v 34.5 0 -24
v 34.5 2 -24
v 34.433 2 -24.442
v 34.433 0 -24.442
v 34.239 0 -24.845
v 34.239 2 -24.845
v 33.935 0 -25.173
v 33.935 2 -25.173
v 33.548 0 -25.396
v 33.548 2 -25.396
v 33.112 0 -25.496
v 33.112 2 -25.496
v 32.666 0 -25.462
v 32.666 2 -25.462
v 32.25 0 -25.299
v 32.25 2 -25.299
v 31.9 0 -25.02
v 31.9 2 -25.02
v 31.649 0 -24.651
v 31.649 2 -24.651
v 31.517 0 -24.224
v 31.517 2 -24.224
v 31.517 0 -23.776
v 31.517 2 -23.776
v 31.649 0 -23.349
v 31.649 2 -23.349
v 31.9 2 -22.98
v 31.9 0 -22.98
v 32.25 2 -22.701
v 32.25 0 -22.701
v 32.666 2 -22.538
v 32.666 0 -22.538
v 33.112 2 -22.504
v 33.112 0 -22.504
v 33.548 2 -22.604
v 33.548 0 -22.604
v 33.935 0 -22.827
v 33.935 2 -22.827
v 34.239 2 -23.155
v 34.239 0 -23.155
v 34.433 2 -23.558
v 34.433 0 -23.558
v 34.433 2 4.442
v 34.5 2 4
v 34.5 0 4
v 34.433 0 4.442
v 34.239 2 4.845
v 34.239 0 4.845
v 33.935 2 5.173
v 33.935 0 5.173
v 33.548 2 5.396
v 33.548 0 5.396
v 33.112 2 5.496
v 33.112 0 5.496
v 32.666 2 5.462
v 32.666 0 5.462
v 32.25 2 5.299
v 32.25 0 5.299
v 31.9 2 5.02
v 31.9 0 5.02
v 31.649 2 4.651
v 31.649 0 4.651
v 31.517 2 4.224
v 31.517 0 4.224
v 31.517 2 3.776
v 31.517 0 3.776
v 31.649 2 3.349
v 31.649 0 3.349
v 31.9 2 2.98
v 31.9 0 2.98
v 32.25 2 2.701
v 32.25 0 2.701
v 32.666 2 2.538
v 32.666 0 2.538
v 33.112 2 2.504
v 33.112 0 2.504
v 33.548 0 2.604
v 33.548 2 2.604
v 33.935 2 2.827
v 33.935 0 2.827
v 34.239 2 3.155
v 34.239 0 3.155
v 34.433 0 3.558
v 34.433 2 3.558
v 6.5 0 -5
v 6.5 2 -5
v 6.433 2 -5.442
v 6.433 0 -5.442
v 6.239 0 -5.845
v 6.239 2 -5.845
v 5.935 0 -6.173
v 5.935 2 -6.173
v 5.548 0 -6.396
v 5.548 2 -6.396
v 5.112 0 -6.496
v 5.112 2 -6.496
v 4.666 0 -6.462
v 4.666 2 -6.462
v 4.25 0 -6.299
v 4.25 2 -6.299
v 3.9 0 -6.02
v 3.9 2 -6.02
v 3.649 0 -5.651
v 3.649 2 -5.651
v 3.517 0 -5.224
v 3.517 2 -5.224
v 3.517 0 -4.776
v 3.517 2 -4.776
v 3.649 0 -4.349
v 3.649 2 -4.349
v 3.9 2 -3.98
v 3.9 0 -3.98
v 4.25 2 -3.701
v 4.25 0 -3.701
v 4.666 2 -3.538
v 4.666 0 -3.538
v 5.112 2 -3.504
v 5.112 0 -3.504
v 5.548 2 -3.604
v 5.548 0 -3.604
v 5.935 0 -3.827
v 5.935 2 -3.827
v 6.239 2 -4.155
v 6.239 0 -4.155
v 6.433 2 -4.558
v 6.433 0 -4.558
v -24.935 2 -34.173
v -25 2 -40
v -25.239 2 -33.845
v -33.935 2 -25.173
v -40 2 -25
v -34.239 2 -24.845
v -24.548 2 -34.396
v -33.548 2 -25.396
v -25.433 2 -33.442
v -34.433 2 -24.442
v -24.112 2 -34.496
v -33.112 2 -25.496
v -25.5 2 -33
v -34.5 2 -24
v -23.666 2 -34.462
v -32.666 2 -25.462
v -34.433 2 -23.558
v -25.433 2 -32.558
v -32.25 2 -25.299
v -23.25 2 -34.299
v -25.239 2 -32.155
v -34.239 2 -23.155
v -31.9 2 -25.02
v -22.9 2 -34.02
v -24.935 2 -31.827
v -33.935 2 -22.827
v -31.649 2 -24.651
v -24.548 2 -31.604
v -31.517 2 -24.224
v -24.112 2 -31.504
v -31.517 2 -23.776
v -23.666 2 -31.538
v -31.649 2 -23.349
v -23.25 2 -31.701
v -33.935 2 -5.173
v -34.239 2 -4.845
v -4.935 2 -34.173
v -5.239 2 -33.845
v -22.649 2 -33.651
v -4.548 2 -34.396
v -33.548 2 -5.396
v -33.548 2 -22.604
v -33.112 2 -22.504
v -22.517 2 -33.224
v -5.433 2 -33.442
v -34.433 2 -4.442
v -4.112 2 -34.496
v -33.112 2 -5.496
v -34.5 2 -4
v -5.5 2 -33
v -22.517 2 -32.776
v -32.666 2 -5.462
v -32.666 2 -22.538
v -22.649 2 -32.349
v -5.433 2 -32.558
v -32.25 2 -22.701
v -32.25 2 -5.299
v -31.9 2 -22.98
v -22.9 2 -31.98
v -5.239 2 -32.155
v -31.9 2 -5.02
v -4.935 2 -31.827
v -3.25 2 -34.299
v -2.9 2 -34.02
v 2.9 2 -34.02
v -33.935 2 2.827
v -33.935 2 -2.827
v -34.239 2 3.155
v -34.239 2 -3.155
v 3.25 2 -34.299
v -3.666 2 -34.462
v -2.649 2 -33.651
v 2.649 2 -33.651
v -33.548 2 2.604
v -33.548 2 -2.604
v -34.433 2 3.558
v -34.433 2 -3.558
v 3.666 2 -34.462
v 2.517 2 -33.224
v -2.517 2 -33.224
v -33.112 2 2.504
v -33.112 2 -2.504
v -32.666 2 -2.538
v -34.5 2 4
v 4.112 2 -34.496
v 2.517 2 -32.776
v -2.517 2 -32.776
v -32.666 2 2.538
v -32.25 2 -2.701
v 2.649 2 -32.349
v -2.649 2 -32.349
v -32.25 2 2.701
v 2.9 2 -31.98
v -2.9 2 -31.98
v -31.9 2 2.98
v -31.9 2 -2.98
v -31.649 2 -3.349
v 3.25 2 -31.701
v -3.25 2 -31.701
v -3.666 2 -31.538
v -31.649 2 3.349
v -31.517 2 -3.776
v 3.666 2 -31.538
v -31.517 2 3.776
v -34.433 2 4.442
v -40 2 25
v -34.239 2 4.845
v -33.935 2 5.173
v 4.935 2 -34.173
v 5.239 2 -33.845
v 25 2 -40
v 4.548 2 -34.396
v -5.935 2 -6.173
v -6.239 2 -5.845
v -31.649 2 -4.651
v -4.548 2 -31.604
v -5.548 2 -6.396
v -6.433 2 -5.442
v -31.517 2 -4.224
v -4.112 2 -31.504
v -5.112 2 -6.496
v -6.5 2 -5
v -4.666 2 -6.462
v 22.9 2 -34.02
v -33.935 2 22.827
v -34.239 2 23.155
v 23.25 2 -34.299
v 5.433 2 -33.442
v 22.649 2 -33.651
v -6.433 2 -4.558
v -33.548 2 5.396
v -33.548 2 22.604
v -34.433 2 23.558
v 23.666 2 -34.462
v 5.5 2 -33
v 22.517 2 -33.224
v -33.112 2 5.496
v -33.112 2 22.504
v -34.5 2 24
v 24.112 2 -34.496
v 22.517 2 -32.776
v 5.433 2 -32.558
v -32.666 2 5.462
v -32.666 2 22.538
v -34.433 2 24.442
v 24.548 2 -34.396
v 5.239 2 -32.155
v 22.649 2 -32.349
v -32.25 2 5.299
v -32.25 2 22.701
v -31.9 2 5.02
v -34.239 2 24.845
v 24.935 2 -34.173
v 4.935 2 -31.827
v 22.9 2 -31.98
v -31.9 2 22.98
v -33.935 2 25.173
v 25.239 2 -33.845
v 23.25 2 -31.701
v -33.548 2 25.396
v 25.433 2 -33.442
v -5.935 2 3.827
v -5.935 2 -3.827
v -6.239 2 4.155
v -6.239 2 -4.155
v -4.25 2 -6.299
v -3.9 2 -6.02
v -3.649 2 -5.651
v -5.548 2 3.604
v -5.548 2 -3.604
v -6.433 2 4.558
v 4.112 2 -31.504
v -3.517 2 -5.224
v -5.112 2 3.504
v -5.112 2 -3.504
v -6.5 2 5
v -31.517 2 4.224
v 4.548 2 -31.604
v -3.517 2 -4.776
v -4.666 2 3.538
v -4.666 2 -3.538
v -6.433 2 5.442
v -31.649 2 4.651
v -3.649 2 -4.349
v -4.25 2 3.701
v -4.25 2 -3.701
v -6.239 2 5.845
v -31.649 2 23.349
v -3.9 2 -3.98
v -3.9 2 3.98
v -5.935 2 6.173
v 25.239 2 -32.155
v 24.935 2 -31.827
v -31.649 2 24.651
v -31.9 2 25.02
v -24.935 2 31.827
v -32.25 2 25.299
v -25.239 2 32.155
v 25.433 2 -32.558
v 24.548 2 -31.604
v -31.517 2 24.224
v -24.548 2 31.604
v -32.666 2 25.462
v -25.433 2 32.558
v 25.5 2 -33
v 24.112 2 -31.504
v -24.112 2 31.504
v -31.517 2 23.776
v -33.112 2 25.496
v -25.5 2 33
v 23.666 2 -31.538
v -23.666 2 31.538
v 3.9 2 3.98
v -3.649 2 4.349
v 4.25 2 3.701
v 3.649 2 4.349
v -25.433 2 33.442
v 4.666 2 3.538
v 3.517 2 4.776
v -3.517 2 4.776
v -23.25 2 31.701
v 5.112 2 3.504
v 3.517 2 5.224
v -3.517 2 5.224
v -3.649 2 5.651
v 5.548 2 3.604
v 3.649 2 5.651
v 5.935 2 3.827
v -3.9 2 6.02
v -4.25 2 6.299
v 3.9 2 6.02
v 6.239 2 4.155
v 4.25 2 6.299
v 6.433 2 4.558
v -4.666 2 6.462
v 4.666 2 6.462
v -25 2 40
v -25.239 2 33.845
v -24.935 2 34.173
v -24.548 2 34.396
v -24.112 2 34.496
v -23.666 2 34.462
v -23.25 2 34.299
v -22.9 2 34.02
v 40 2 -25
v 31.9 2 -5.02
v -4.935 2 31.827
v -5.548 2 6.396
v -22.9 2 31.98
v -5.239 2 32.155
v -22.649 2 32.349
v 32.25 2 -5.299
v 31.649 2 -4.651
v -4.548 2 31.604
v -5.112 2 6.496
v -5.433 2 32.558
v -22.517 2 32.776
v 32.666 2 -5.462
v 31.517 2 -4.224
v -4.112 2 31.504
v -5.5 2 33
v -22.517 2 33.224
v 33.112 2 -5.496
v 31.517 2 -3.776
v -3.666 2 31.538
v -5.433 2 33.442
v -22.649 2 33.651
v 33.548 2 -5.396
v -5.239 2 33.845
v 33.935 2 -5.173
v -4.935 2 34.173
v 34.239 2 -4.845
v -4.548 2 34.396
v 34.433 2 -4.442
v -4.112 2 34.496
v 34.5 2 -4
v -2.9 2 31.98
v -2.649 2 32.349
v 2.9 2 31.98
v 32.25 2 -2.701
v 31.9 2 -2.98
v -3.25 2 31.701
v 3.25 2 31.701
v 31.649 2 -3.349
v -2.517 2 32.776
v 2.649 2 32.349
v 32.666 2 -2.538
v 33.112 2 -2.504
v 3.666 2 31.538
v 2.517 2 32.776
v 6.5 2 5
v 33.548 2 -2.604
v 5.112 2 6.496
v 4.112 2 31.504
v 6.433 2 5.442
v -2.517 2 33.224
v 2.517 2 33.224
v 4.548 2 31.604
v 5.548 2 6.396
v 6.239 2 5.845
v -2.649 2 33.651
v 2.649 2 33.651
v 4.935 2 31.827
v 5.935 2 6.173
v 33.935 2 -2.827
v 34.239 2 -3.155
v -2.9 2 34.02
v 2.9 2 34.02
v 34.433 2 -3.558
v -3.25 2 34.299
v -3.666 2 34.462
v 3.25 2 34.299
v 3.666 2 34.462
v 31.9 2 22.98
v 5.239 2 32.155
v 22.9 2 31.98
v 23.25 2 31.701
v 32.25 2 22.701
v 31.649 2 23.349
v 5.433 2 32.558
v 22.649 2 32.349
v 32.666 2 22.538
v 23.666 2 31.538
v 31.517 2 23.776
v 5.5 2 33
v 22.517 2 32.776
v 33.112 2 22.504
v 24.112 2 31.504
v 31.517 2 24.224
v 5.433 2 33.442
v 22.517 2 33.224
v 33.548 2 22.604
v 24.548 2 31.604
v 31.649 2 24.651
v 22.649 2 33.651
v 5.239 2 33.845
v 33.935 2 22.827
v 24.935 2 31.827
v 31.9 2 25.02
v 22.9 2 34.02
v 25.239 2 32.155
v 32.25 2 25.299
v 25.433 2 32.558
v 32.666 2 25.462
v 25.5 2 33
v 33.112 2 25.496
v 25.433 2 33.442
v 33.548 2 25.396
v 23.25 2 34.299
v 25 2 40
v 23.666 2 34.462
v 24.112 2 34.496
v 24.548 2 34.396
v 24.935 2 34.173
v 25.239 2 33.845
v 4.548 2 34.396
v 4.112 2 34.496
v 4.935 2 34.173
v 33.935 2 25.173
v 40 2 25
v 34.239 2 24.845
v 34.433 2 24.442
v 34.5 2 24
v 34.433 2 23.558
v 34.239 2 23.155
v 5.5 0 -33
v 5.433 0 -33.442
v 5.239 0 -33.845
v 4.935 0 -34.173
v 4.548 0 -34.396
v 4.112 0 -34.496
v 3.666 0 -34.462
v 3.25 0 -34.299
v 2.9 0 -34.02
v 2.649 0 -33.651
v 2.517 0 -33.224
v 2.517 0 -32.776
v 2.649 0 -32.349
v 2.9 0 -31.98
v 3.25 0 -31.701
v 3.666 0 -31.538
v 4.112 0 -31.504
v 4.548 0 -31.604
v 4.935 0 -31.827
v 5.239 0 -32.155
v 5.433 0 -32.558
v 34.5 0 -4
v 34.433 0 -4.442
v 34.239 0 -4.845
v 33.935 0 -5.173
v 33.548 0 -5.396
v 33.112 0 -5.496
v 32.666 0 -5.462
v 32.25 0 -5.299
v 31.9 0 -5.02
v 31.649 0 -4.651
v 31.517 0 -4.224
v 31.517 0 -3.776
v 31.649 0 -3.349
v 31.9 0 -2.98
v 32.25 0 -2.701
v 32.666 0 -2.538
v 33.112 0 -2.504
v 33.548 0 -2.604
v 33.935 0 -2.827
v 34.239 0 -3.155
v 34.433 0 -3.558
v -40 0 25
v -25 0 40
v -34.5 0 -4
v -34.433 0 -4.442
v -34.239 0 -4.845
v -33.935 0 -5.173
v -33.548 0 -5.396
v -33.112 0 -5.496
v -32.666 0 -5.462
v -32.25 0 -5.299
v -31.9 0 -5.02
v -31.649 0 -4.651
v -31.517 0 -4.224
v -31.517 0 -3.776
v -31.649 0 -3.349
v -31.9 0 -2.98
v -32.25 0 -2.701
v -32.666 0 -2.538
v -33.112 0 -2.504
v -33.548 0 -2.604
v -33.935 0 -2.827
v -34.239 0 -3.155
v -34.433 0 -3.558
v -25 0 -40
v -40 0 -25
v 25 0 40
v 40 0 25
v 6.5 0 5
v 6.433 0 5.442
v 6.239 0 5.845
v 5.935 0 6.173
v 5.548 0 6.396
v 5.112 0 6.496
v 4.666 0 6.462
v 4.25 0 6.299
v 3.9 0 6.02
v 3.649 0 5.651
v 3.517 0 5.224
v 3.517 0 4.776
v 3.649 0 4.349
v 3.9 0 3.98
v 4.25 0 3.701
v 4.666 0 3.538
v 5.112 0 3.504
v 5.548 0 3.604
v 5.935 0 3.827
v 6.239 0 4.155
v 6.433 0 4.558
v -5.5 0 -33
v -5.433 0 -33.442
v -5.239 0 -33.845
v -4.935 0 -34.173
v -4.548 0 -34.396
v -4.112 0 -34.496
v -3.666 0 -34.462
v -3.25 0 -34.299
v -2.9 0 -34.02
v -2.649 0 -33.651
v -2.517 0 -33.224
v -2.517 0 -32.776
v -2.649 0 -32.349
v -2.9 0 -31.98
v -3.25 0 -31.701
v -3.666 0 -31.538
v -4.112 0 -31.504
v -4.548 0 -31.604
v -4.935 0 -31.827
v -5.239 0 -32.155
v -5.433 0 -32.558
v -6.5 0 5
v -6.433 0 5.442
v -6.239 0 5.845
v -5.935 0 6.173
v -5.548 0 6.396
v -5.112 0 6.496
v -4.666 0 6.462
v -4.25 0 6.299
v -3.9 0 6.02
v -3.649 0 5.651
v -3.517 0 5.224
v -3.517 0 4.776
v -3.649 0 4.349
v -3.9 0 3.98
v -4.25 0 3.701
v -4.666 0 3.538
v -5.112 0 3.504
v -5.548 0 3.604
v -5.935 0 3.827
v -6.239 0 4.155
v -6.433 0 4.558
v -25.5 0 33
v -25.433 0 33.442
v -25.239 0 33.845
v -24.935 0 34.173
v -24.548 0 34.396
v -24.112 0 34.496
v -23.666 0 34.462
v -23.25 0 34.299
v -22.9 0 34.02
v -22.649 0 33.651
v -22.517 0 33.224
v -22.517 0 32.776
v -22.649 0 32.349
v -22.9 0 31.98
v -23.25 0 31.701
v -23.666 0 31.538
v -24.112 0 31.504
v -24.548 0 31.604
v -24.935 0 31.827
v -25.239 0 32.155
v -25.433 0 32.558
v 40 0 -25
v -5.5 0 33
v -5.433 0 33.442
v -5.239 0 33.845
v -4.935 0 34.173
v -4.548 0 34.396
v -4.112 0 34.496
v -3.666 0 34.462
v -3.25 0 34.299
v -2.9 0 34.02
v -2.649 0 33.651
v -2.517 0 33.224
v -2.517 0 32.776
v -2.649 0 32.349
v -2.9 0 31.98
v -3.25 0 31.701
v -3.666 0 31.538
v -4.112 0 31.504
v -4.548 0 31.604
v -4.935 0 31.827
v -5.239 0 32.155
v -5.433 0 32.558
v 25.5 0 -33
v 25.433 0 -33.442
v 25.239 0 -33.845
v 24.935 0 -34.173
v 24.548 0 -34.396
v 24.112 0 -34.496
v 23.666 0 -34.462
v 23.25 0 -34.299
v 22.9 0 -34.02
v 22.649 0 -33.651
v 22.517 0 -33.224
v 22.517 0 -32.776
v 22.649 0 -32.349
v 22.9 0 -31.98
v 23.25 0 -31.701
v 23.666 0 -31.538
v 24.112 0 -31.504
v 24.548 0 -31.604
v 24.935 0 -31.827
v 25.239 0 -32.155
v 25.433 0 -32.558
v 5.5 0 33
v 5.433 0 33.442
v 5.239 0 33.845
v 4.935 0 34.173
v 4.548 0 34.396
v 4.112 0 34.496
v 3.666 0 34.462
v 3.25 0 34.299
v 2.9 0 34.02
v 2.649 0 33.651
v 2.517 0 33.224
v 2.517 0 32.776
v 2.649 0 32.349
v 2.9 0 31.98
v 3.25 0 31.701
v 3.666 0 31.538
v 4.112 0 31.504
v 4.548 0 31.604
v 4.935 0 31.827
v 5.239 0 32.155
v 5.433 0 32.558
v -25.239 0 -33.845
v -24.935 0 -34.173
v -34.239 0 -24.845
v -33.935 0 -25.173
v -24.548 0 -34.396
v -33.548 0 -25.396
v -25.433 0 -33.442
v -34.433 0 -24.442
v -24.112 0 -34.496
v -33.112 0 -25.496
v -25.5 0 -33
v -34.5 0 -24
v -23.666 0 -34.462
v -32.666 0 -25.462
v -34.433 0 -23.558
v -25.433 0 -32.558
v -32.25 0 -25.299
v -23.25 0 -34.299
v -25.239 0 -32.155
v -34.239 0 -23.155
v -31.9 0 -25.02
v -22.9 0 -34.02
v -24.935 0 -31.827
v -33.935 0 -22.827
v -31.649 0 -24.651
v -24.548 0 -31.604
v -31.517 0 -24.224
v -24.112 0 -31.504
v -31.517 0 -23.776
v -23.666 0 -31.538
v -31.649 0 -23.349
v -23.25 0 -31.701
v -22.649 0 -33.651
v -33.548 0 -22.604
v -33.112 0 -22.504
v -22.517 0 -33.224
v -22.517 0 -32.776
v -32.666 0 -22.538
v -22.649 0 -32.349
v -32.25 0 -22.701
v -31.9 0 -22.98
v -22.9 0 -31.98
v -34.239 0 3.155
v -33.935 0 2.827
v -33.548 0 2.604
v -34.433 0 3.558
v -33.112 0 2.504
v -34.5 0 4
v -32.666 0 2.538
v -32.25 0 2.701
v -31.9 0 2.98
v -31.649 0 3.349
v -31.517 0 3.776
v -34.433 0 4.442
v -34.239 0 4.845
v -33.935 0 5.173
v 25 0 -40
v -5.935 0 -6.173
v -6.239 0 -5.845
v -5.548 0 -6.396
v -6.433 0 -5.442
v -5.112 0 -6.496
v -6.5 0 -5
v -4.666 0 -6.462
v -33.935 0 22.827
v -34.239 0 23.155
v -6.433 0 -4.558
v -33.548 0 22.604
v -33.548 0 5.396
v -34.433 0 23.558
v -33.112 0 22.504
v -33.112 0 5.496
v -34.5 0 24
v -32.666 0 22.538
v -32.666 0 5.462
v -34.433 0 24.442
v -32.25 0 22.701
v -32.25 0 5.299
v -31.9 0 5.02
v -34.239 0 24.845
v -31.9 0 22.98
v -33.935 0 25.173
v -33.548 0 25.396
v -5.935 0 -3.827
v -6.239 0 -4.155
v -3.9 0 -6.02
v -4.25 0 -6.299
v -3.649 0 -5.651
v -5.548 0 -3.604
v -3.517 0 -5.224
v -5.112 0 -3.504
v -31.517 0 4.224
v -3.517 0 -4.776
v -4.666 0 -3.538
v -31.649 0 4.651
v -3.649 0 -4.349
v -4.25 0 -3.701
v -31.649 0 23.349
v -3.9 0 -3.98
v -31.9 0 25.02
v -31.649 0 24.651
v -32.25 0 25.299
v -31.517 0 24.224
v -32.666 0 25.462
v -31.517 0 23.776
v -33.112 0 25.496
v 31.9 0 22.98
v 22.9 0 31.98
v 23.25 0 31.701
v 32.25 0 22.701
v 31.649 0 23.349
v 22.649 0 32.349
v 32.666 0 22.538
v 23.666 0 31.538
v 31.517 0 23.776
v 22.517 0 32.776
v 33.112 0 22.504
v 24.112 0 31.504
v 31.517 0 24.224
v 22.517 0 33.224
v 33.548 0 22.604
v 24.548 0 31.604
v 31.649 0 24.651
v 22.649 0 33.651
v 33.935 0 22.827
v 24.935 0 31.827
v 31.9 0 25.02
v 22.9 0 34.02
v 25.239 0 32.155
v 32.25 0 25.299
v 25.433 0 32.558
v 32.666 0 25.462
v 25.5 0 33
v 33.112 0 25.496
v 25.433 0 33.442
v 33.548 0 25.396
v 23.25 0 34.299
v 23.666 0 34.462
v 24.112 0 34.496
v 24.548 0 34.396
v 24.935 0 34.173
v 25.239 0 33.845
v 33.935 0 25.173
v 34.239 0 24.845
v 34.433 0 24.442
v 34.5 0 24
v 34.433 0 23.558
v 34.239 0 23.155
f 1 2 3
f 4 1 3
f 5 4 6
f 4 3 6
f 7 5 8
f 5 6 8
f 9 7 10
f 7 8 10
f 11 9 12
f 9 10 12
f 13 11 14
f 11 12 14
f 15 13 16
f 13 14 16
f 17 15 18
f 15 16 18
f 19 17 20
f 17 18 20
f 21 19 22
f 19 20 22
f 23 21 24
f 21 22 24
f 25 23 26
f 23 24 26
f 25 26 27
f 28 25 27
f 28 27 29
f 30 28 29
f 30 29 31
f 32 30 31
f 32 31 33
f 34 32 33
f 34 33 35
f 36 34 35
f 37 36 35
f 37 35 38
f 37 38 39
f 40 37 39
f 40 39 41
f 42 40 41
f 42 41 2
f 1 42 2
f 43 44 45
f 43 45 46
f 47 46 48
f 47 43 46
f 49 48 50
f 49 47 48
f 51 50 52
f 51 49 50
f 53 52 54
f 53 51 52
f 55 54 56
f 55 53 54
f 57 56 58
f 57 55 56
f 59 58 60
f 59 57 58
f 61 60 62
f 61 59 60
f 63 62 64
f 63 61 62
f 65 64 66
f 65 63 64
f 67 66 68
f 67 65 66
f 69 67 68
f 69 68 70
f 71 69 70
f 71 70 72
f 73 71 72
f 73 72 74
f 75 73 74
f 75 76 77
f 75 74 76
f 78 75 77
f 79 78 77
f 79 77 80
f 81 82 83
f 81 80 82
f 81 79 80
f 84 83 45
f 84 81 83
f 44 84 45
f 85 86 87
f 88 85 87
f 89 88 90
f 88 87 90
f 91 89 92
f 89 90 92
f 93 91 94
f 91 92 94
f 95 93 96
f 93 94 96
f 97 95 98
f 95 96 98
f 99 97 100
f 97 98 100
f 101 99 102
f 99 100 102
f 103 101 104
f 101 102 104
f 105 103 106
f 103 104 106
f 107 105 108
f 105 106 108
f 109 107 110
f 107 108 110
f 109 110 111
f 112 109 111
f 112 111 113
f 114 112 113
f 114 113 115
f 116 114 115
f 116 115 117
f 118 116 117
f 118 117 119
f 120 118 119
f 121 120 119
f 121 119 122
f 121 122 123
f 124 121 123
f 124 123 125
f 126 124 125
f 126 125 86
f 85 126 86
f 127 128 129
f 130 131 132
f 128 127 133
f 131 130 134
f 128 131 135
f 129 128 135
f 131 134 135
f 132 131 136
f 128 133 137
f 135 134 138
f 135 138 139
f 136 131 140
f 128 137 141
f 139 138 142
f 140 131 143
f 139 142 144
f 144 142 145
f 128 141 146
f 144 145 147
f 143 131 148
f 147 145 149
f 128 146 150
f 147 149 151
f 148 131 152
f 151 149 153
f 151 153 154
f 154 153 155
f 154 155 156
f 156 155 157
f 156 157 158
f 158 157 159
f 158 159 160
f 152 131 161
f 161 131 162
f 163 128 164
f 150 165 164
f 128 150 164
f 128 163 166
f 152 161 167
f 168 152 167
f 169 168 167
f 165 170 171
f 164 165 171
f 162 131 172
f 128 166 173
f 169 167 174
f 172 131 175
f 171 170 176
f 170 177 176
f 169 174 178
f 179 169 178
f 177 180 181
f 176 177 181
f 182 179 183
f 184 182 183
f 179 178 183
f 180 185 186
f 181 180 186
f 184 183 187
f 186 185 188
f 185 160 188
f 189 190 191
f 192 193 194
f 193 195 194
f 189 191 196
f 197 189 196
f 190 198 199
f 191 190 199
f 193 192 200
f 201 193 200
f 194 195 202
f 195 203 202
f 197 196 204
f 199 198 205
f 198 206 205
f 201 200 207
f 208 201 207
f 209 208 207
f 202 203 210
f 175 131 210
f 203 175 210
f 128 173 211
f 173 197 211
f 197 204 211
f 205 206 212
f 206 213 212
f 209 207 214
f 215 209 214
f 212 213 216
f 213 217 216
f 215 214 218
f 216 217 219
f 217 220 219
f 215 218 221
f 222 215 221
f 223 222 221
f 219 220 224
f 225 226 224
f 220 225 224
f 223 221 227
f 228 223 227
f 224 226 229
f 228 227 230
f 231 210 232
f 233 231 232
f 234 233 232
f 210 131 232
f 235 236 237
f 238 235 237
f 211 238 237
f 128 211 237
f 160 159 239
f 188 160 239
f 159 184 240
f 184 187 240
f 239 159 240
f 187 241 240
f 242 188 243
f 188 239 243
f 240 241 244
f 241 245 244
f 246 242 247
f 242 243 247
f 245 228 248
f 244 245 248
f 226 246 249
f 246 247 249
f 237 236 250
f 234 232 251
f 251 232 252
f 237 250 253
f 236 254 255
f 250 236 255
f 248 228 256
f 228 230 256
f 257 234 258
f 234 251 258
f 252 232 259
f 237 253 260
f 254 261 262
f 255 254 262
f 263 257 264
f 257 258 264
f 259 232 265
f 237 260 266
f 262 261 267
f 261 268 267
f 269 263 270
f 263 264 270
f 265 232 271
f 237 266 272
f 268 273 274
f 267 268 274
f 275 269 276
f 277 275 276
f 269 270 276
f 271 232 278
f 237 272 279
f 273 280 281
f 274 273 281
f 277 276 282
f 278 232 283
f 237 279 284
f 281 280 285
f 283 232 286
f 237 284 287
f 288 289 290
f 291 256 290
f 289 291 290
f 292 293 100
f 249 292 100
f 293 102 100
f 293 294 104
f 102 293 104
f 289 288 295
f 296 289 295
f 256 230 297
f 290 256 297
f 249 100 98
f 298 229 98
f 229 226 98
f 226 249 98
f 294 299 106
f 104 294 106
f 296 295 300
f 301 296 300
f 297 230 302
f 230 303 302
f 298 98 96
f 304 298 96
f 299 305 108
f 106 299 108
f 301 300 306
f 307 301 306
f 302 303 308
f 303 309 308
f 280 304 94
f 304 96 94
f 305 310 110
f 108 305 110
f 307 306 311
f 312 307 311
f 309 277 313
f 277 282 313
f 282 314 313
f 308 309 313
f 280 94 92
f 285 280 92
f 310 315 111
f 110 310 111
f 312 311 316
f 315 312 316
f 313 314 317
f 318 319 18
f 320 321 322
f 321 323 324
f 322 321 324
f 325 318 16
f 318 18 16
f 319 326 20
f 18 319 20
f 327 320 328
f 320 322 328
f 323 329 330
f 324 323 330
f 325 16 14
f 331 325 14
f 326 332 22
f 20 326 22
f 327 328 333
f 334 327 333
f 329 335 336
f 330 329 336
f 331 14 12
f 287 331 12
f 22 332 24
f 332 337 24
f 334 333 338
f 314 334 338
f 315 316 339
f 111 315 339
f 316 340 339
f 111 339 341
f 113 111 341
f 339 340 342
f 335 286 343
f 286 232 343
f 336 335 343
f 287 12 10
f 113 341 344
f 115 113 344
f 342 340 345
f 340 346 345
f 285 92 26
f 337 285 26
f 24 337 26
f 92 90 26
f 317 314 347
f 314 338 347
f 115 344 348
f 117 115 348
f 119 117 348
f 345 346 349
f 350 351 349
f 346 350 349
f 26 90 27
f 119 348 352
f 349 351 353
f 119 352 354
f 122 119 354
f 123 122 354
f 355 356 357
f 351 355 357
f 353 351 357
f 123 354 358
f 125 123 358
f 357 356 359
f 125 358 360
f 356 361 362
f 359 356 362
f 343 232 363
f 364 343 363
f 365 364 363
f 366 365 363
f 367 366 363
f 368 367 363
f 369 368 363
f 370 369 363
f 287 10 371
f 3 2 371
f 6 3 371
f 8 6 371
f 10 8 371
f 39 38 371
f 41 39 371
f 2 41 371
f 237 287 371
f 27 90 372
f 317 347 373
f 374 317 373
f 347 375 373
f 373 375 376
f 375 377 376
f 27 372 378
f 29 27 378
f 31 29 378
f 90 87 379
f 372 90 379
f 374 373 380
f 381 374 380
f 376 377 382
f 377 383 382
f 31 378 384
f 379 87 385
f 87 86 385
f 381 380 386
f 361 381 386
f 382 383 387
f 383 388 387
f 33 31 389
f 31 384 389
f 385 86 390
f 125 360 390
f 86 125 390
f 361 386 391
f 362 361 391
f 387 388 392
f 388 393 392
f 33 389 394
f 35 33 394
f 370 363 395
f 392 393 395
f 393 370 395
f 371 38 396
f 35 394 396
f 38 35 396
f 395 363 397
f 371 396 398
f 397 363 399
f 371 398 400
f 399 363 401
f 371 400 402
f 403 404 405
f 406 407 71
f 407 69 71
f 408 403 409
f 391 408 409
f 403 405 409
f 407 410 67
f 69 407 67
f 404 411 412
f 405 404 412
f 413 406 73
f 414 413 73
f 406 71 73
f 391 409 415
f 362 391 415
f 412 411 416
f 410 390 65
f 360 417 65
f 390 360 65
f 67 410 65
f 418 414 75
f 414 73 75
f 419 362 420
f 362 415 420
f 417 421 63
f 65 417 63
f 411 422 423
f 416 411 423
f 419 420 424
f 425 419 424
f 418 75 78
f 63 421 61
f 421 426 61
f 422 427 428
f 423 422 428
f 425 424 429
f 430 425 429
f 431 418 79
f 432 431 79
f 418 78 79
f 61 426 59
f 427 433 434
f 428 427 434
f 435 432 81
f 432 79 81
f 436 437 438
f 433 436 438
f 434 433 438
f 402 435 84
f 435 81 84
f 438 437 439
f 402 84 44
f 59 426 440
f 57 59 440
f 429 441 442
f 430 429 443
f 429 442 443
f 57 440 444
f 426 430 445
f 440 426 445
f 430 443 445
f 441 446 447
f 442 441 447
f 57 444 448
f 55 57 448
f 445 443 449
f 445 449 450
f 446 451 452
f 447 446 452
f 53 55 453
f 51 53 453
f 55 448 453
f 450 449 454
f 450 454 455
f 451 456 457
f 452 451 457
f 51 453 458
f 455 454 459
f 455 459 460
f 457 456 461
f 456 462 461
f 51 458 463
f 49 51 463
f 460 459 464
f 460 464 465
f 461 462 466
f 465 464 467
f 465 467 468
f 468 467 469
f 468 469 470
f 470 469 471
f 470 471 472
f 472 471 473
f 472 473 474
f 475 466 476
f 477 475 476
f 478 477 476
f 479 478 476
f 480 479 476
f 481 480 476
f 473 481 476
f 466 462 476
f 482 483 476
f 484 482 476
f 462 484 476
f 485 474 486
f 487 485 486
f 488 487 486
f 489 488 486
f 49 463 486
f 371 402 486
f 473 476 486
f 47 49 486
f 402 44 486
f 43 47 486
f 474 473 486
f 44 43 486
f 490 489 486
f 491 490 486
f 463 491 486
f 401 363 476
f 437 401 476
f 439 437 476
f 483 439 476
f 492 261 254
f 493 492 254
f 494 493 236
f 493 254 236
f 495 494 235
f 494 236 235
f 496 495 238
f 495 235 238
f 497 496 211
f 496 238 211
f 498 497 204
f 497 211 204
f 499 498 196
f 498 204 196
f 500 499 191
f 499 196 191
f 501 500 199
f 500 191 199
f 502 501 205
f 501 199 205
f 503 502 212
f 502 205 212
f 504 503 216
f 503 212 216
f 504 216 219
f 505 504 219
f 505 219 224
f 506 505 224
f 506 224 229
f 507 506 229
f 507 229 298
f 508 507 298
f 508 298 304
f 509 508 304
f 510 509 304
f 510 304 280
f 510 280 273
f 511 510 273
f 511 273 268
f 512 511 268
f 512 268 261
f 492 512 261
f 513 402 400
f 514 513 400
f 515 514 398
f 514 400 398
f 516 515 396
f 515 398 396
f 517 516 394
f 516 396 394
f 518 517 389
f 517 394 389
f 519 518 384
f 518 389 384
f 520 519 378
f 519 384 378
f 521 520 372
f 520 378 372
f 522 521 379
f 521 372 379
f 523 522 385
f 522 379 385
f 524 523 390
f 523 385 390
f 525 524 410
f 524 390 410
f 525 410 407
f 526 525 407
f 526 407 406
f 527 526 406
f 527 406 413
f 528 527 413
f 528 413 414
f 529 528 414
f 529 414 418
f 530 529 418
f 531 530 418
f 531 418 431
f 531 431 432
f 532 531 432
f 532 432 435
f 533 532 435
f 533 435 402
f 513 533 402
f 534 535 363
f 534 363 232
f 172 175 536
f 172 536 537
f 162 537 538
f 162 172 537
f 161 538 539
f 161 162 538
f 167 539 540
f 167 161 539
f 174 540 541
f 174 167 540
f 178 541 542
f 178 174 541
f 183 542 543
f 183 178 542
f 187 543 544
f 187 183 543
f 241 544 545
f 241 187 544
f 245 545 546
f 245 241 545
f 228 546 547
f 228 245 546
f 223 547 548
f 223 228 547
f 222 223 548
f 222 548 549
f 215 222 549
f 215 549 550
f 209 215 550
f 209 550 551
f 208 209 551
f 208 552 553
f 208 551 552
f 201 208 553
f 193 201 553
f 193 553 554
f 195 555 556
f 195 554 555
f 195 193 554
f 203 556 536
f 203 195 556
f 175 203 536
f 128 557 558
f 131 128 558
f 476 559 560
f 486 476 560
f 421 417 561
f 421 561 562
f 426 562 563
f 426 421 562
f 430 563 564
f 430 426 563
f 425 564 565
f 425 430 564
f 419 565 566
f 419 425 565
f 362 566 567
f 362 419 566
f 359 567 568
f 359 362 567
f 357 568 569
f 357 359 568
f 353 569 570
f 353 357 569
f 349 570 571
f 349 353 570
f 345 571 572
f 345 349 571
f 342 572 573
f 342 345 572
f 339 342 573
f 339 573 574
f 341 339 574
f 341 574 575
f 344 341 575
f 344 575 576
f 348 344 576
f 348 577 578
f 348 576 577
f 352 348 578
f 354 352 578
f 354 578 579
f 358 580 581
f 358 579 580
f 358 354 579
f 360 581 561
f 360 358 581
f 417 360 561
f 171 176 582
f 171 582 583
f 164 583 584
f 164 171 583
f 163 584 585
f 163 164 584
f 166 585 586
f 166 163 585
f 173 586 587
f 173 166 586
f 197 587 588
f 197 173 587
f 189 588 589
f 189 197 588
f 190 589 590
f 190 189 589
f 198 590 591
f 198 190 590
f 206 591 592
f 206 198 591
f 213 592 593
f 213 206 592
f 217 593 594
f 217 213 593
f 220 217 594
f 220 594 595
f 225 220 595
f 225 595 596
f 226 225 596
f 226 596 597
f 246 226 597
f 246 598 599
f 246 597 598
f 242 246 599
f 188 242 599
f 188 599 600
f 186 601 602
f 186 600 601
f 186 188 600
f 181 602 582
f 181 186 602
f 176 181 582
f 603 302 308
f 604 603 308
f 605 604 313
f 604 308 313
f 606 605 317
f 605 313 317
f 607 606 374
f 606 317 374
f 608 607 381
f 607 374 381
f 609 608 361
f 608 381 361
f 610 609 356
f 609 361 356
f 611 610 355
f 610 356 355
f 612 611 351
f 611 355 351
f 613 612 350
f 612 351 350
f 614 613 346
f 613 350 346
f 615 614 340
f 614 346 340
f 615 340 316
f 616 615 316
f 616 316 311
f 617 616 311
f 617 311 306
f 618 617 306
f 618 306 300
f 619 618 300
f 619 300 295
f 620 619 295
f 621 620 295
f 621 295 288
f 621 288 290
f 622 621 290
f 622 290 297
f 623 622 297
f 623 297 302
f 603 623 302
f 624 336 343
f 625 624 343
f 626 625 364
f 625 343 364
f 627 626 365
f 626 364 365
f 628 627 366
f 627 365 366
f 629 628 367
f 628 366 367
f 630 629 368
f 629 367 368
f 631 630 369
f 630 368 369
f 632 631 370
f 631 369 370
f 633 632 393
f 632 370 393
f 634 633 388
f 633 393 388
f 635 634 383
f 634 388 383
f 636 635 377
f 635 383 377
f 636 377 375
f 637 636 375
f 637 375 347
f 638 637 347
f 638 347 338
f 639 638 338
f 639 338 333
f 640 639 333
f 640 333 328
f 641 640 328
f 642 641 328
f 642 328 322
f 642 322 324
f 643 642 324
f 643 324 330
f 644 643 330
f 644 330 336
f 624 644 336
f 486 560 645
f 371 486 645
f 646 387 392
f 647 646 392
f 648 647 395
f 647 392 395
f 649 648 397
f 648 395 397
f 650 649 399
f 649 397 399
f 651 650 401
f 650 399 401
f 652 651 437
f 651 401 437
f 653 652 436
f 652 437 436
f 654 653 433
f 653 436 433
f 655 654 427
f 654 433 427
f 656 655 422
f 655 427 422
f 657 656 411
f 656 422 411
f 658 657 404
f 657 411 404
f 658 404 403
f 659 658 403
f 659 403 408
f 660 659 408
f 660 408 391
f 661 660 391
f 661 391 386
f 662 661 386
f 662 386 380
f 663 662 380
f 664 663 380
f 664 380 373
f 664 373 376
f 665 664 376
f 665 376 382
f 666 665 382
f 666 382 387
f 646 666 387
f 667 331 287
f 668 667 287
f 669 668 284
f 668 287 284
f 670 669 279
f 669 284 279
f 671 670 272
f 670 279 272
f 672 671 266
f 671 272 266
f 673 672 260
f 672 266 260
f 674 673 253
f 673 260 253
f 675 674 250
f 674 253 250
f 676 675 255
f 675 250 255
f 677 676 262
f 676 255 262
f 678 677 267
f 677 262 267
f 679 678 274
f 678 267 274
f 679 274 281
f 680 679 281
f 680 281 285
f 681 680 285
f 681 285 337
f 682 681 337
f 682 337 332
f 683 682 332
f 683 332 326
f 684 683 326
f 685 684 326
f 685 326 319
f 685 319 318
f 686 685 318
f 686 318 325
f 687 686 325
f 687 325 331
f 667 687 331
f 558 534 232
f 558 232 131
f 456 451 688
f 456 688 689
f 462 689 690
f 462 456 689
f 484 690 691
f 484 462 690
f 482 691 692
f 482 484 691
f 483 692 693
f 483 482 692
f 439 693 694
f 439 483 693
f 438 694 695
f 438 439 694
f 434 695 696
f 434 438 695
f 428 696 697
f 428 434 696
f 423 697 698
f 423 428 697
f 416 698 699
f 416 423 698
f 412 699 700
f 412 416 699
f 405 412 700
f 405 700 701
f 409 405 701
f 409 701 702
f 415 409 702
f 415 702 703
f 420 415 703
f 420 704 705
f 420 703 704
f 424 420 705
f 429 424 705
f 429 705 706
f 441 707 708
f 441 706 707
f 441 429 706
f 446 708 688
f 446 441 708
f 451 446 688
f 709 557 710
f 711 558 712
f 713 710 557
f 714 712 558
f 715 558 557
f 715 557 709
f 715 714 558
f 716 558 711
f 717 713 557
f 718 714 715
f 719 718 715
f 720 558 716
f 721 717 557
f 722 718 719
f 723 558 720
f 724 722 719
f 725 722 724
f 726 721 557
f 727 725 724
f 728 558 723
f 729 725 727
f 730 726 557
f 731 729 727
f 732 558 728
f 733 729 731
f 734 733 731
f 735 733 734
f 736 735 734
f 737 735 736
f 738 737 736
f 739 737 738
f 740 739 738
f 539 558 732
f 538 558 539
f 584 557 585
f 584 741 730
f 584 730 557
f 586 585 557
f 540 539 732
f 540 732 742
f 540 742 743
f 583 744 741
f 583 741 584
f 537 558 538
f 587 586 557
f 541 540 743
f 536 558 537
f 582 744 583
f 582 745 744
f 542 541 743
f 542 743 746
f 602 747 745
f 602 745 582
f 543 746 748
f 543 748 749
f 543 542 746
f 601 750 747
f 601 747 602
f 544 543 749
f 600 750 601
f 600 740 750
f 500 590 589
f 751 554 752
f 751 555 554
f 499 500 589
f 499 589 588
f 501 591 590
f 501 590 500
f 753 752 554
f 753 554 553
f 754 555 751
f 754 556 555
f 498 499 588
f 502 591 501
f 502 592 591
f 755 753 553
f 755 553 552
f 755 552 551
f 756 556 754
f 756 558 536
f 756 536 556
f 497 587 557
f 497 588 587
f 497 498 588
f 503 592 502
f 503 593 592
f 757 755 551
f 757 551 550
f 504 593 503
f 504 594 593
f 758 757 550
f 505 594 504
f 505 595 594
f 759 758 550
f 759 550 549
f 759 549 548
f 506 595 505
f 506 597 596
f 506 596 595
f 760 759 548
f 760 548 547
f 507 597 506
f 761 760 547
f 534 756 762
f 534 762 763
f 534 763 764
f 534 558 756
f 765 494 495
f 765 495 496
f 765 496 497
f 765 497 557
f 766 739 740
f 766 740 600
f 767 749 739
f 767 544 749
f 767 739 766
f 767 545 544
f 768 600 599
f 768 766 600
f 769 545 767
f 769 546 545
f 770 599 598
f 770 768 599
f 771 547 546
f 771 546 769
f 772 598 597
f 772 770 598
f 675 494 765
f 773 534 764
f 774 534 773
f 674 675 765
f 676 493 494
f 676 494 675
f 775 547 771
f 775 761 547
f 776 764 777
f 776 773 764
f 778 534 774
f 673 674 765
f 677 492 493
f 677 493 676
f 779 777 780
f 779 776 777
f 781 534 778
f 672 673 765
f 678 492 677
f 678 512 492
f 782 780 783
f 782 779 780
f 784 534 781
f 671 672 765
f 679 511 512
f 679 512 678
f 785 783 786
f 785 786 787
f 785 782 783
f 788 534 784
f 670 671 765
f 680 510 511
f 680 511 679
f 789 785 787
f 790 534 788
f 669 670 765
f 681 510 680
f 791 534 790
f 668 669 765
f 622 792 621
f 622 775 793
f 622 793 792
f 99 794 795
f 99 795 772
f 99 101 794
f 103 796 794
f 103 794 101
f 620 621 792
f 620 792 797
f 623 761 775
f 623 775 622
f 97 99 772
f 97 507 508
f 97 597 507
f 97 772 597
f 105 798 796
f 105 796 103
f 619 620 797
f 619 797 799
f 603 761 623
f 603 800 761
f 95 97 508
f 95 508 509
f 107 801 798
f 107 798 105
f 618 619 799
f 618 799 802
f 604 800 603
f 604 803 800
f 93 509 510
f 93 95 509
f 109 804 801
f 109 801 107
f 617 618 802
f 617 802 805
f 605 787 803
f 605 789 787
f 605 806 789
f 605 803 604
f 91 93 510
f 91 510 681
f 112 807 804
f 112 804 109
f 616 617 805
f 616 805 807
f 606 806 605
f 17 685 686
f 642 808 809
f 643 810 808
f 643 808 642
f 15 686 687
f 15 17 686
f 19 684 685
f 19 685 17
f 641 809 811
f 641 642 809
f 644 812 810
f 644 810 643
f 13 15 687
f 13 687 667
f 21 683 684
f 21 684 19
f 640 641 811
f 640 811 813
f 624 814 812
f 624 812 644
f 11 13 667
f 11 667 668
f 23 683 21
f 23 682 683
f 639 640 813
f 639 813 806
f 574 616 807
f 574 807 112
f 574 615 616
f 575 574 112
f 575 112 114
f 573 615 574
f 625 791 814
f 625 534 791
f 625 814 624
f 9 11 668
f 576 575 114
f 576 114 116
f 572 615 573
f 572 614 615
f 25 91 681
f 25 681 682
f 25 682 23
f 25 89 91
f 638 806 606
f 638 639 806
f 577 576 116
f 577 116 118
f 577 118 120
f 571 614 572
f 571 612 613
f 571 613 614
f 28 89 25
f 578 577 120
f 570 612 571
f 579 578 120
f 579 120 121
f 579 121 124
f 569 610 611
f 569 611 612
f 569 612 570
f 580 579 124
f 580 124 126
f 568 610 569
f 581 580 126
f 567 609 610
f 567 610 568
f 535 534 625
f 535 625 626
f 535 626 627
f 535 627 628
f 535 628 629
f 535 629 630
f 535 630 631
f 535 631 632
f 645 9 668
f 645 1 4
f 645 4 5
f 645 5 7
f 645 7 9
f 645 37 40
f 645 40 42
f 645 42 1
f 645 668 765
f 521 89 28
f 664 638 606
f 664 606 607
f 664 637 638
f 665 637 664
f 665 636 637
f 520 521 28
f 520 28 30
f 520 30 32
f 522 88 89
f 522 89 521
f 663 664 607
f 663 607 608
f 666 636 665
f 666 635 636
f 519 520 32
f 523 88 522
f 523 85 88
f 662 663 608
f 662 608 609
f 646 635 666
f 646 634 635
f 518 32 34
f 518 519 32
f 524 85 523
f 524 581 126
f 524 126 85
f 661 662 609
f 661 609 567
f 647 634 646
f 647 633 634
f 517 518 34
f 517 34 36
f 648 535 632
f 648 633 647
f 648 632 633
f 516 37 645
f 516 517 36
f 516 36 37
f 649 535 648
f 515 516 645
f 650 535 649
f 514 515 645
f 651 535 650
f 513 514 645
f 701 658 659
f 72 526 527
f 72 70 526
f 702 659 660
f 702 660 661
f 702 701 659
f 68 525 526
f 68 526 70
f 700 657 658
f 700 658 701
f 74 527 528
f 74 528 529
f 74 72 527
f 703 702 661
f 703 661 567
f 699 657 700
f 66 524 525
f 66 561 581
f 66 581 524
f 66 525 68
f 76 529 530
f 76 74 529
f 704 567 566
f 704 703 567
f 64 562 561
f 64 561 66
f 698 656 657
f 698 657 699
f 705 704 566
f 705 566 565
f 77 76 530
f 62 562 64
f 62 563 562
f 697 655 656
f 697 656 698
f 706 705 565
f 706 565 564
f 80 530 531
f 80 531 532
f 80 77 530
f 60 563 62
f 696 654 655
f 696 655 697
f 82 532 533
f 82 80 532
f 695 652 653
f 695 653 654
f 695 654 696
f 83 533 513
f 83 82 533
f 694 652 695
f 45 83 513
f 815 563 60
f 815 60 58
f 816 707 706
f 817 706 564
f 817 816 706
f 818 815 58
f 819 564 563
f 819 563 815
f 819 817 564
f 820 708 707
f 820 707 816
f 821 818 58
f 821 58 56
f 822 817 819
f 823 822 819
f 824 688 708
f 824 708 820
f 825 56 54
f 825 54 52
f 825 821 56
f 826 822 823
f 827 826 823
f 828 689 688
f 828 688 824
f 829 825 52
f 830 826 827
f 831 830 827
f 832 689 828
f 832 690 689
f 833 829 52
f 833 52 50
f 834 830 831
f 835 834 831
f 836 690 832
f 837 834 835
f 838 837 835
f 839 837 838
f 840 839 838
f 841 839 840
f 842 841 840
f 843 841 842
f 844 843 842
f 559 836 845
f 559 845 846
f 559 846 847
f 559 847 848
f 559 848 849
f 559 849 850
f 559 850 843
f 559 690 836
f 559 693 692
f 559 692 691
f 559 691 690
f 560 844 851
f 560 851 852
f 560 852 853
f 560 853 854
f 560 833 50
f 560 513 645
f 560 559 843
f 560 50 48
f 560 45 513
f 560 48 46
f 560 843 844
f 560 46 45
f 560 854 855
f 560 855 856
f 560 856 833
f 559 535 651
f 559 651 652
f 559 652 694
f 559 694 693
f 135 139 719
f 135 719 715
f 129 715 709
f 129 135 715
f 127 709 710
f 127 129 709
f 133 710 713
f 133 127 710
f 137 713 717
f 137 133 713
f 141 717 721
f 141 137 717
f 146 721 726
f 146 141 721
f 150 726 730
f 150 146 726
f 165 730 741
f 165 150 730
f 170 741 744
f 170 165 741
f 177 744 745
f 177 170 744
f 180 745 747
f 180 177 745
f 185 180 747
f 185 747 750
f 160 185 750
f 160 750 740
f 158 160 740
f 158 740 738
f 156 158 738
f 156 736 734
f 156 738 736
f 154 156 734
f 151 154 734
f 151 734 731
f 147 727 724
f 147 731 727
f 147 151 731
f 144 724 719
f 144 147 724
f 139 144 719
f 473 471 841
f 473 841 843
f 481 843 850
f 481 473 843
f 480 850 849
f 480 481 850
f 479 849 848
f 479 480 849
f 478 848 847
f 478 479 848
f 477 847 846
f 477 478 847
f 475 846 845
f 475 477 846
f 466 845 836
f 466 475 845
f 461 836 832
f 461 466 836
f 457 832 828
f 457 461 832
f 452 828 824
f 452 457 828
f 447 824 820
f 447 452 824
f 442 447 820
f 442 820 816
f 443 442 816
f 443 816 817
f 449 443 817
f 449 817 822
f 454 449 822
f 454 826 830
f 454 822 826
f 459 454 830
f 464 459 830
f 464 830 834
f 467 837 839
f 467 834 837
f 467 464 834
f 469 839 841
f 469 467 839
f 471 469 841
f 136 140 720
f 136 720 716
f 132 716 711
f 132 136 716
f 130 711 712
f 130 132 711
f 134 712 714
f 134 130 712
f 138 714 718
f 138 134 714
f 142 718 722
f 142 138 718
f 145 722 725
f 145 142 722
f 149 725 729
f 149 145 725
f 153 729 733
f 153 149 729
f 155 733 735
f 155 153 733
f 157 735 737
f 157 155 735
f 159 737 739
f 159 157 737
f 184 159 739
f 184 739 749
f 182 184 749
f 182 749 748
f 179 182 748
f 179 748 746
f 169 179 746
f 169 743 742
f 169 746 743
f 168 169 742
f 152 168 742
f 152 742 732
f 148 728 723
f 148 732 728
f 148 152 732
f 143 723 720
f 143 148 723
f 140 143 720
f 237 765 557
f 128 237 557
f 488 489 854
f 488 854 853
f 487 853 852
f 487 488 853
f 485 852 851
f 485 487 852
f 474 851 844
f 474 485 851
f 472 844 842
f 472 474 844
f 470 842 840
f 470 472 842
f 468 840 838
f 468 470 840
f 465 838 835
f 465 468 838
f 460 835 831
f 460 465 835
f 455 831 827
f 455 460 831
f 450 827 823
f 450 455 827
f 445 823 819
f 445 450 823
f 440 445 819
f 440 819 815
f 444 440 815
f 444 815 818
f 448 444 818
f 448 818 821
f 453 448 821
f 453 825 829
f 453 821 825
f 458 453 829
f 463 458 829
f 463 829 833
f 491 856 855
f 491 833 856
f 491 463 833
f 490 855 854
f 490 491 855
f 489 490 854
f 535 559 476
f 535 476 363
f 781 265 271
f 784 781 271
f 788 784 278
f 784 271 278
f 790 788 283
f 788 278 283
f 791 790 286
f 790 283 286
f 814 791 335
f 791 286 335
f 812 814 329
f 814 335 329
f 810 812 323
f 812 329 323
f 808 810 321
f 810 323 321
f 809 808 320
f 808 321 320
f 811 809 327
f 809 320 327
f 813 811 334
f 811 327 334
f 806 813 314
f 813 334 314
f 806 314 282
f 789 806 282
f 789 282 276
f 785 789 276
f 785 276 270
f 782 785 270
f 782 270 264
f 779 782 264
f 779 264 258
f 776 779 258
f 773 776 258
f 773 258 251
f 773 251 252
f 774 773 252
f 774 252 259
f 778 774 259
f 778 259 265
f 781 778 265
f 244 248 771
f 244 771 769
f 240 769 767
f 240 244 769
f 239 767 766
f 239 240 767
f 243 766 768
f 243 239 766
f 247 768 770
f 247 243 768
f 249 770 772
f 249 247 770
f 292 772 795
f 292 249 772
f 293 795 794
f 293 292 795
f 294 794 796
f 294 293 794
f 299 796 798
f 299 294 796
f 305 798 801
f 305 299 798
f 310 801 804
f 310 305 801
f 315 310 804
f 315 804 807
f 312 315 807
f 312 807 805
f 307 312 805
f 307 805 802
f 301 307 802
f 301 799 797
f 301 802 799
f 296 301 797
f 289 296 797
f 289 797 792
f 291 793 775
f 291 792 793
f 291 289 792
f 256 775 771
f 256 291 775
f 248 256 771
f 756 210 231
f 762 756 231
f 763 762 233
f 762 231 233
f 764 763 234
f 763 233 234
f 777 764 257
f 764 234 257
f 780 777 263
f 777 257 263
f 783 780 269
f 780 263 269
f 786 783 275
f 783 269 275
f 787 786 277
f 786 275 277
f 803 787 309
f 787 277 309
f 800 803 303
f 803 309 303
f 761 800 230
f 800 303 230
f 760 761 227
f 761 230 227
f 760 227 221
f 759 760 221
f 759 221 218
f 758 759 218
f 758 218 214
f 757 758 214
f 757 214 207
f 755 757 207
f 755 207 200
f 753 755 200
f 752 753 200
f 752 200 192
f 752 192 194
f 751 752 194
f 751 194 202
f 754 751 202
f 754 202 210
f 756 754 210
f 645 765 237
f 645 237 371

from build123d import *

# Parameters (mm, degrees)
BOSS_EXTRUDE1_DEPTH                        = 2
SKETCH6_R                                  = 1.5
CUT_EXTRUDE3_DEPTH                         = 4
MIRROR2_AT_THE_SECOND_PLANE_COPY_1_DEPTH   = 2
MIRROR2_AT_THE_SECOND_PLANE_COPY_2_SKETC_R = 1.5
MIRROR2_AT_THE_SECOND_PLANE_COPY_2_DEPTH   = 4


with BuildPart() as part:
    # Sketch1 → Boss-Extrude1 (new body)
    with BuildSketch(Plane(origin=(0, 0, 0), x_dir=(1, 0, 0), z_dir=(0, 1, 0))):
        Polygon((25, 40), (40, 25), (40, 0), (0, 0), (0, 40), align=None)
    boss_extrude1 = extrude(amount=BOSS_EXTRUDE1_DEPTH)

    # Sketch6 → Cut-Extrude3 (cut, through all)
    with BuildSketch(Plane(origin=(0, 3, 0), x_dir=(1, 0, 0), z_dir=(0, 1, 0))):
        with Locations((33, 24)):
            Circle(SKETCH6_R)
        with Locations((24, 33)):
            Circle(SKETCH6_R)
        with Locations((4, 33)):
            Circle(SKETCH6_R)
        with Locations((33, 4)):
            Circle(SKETCH6_R)
        with Locations((5, 5)):
            Circle(SKETCH6_R)
    cut_extrude3 = extrude(amount=-CUT_EXTRUDE3_DEPTH, mode=Mode.SUBTRACT)

    # Mirror2: Boss-Extrude1, Cut-Extrude3 across plane
    add(boss_extrude1.mirror(Plane(origin=(0, 0, 0), x_dir=(0, 0, 1), z_dir=(1, 0, 0))))
    add(cut_extrude3.mirror(Plane(origin=(0, 0, 0), x_dir=(0, 0, 1), z_dir=(1, 0, 0))), mode=Mode.SUBTRACT)

    # Mirror2 at the second plane: Boss-Extrude1, Cut-Extrude3 across plane
    add(boss_extrude1.mirror(Plane.XY))
    add(cut_extrude3.mirror(Plane.XY), mode=Mode.SUBTRACT)

    # Mirror2 at the second plane copy 1 sketc → Mirror2 at the second plane copy 1 (add)
    with BuildSketch(Plane(origin=(0, 0, 0), x_dir=(-1, 0, 0), z_dir=(0, 1, 0))):
        Polygon((25, 40), (40, 25), (40, 0), (0, 0), (0, 40), align=None)
    extrude(amount=MIRROR2_AT_THE_SECOND_PLANE_COPY_1_DEPTH)

    # Mirror2 at the second plane copy 2 sketc → Mirror2 at the second plane copy 2 (cut, through all)
    with BuildSketch(Plane(origin=(0, 3, 0), x_dir=(-1, 0, 0), z_dir=(0, 1, 0))):
        with Locations((33, 24)):
            Circle(MIRROR2_AT_THE_SECOND_PLANE_COPY_2_SKETC_R)
        with Locations((24, 33)):
            Circle(MIRROR2_AT_THE_SECOND_PLANE_COPY_2_SKETC_R)
        with Locations((4, 33)):
            Circle(MIRROR2_AT_THE_SECOND_PLANE_COPY_2_SKETC_R)
        with Locations((33, 4)):
            Circle(MIRROR2_AT_THE_SECOND_PLANE_COPY_2_SKETC_R)
        with Locations((5, 5)):
            Circle(MIRROR2_AT_THE_SECOND_PLANE_COPY_2_SKETC_R)
    extrude(amount=-MIRROR2_AT_THE_SECOND_PLANE_COPY_2_DEPTH, mode=Mode.SUBTRACT)


solid = part.part
